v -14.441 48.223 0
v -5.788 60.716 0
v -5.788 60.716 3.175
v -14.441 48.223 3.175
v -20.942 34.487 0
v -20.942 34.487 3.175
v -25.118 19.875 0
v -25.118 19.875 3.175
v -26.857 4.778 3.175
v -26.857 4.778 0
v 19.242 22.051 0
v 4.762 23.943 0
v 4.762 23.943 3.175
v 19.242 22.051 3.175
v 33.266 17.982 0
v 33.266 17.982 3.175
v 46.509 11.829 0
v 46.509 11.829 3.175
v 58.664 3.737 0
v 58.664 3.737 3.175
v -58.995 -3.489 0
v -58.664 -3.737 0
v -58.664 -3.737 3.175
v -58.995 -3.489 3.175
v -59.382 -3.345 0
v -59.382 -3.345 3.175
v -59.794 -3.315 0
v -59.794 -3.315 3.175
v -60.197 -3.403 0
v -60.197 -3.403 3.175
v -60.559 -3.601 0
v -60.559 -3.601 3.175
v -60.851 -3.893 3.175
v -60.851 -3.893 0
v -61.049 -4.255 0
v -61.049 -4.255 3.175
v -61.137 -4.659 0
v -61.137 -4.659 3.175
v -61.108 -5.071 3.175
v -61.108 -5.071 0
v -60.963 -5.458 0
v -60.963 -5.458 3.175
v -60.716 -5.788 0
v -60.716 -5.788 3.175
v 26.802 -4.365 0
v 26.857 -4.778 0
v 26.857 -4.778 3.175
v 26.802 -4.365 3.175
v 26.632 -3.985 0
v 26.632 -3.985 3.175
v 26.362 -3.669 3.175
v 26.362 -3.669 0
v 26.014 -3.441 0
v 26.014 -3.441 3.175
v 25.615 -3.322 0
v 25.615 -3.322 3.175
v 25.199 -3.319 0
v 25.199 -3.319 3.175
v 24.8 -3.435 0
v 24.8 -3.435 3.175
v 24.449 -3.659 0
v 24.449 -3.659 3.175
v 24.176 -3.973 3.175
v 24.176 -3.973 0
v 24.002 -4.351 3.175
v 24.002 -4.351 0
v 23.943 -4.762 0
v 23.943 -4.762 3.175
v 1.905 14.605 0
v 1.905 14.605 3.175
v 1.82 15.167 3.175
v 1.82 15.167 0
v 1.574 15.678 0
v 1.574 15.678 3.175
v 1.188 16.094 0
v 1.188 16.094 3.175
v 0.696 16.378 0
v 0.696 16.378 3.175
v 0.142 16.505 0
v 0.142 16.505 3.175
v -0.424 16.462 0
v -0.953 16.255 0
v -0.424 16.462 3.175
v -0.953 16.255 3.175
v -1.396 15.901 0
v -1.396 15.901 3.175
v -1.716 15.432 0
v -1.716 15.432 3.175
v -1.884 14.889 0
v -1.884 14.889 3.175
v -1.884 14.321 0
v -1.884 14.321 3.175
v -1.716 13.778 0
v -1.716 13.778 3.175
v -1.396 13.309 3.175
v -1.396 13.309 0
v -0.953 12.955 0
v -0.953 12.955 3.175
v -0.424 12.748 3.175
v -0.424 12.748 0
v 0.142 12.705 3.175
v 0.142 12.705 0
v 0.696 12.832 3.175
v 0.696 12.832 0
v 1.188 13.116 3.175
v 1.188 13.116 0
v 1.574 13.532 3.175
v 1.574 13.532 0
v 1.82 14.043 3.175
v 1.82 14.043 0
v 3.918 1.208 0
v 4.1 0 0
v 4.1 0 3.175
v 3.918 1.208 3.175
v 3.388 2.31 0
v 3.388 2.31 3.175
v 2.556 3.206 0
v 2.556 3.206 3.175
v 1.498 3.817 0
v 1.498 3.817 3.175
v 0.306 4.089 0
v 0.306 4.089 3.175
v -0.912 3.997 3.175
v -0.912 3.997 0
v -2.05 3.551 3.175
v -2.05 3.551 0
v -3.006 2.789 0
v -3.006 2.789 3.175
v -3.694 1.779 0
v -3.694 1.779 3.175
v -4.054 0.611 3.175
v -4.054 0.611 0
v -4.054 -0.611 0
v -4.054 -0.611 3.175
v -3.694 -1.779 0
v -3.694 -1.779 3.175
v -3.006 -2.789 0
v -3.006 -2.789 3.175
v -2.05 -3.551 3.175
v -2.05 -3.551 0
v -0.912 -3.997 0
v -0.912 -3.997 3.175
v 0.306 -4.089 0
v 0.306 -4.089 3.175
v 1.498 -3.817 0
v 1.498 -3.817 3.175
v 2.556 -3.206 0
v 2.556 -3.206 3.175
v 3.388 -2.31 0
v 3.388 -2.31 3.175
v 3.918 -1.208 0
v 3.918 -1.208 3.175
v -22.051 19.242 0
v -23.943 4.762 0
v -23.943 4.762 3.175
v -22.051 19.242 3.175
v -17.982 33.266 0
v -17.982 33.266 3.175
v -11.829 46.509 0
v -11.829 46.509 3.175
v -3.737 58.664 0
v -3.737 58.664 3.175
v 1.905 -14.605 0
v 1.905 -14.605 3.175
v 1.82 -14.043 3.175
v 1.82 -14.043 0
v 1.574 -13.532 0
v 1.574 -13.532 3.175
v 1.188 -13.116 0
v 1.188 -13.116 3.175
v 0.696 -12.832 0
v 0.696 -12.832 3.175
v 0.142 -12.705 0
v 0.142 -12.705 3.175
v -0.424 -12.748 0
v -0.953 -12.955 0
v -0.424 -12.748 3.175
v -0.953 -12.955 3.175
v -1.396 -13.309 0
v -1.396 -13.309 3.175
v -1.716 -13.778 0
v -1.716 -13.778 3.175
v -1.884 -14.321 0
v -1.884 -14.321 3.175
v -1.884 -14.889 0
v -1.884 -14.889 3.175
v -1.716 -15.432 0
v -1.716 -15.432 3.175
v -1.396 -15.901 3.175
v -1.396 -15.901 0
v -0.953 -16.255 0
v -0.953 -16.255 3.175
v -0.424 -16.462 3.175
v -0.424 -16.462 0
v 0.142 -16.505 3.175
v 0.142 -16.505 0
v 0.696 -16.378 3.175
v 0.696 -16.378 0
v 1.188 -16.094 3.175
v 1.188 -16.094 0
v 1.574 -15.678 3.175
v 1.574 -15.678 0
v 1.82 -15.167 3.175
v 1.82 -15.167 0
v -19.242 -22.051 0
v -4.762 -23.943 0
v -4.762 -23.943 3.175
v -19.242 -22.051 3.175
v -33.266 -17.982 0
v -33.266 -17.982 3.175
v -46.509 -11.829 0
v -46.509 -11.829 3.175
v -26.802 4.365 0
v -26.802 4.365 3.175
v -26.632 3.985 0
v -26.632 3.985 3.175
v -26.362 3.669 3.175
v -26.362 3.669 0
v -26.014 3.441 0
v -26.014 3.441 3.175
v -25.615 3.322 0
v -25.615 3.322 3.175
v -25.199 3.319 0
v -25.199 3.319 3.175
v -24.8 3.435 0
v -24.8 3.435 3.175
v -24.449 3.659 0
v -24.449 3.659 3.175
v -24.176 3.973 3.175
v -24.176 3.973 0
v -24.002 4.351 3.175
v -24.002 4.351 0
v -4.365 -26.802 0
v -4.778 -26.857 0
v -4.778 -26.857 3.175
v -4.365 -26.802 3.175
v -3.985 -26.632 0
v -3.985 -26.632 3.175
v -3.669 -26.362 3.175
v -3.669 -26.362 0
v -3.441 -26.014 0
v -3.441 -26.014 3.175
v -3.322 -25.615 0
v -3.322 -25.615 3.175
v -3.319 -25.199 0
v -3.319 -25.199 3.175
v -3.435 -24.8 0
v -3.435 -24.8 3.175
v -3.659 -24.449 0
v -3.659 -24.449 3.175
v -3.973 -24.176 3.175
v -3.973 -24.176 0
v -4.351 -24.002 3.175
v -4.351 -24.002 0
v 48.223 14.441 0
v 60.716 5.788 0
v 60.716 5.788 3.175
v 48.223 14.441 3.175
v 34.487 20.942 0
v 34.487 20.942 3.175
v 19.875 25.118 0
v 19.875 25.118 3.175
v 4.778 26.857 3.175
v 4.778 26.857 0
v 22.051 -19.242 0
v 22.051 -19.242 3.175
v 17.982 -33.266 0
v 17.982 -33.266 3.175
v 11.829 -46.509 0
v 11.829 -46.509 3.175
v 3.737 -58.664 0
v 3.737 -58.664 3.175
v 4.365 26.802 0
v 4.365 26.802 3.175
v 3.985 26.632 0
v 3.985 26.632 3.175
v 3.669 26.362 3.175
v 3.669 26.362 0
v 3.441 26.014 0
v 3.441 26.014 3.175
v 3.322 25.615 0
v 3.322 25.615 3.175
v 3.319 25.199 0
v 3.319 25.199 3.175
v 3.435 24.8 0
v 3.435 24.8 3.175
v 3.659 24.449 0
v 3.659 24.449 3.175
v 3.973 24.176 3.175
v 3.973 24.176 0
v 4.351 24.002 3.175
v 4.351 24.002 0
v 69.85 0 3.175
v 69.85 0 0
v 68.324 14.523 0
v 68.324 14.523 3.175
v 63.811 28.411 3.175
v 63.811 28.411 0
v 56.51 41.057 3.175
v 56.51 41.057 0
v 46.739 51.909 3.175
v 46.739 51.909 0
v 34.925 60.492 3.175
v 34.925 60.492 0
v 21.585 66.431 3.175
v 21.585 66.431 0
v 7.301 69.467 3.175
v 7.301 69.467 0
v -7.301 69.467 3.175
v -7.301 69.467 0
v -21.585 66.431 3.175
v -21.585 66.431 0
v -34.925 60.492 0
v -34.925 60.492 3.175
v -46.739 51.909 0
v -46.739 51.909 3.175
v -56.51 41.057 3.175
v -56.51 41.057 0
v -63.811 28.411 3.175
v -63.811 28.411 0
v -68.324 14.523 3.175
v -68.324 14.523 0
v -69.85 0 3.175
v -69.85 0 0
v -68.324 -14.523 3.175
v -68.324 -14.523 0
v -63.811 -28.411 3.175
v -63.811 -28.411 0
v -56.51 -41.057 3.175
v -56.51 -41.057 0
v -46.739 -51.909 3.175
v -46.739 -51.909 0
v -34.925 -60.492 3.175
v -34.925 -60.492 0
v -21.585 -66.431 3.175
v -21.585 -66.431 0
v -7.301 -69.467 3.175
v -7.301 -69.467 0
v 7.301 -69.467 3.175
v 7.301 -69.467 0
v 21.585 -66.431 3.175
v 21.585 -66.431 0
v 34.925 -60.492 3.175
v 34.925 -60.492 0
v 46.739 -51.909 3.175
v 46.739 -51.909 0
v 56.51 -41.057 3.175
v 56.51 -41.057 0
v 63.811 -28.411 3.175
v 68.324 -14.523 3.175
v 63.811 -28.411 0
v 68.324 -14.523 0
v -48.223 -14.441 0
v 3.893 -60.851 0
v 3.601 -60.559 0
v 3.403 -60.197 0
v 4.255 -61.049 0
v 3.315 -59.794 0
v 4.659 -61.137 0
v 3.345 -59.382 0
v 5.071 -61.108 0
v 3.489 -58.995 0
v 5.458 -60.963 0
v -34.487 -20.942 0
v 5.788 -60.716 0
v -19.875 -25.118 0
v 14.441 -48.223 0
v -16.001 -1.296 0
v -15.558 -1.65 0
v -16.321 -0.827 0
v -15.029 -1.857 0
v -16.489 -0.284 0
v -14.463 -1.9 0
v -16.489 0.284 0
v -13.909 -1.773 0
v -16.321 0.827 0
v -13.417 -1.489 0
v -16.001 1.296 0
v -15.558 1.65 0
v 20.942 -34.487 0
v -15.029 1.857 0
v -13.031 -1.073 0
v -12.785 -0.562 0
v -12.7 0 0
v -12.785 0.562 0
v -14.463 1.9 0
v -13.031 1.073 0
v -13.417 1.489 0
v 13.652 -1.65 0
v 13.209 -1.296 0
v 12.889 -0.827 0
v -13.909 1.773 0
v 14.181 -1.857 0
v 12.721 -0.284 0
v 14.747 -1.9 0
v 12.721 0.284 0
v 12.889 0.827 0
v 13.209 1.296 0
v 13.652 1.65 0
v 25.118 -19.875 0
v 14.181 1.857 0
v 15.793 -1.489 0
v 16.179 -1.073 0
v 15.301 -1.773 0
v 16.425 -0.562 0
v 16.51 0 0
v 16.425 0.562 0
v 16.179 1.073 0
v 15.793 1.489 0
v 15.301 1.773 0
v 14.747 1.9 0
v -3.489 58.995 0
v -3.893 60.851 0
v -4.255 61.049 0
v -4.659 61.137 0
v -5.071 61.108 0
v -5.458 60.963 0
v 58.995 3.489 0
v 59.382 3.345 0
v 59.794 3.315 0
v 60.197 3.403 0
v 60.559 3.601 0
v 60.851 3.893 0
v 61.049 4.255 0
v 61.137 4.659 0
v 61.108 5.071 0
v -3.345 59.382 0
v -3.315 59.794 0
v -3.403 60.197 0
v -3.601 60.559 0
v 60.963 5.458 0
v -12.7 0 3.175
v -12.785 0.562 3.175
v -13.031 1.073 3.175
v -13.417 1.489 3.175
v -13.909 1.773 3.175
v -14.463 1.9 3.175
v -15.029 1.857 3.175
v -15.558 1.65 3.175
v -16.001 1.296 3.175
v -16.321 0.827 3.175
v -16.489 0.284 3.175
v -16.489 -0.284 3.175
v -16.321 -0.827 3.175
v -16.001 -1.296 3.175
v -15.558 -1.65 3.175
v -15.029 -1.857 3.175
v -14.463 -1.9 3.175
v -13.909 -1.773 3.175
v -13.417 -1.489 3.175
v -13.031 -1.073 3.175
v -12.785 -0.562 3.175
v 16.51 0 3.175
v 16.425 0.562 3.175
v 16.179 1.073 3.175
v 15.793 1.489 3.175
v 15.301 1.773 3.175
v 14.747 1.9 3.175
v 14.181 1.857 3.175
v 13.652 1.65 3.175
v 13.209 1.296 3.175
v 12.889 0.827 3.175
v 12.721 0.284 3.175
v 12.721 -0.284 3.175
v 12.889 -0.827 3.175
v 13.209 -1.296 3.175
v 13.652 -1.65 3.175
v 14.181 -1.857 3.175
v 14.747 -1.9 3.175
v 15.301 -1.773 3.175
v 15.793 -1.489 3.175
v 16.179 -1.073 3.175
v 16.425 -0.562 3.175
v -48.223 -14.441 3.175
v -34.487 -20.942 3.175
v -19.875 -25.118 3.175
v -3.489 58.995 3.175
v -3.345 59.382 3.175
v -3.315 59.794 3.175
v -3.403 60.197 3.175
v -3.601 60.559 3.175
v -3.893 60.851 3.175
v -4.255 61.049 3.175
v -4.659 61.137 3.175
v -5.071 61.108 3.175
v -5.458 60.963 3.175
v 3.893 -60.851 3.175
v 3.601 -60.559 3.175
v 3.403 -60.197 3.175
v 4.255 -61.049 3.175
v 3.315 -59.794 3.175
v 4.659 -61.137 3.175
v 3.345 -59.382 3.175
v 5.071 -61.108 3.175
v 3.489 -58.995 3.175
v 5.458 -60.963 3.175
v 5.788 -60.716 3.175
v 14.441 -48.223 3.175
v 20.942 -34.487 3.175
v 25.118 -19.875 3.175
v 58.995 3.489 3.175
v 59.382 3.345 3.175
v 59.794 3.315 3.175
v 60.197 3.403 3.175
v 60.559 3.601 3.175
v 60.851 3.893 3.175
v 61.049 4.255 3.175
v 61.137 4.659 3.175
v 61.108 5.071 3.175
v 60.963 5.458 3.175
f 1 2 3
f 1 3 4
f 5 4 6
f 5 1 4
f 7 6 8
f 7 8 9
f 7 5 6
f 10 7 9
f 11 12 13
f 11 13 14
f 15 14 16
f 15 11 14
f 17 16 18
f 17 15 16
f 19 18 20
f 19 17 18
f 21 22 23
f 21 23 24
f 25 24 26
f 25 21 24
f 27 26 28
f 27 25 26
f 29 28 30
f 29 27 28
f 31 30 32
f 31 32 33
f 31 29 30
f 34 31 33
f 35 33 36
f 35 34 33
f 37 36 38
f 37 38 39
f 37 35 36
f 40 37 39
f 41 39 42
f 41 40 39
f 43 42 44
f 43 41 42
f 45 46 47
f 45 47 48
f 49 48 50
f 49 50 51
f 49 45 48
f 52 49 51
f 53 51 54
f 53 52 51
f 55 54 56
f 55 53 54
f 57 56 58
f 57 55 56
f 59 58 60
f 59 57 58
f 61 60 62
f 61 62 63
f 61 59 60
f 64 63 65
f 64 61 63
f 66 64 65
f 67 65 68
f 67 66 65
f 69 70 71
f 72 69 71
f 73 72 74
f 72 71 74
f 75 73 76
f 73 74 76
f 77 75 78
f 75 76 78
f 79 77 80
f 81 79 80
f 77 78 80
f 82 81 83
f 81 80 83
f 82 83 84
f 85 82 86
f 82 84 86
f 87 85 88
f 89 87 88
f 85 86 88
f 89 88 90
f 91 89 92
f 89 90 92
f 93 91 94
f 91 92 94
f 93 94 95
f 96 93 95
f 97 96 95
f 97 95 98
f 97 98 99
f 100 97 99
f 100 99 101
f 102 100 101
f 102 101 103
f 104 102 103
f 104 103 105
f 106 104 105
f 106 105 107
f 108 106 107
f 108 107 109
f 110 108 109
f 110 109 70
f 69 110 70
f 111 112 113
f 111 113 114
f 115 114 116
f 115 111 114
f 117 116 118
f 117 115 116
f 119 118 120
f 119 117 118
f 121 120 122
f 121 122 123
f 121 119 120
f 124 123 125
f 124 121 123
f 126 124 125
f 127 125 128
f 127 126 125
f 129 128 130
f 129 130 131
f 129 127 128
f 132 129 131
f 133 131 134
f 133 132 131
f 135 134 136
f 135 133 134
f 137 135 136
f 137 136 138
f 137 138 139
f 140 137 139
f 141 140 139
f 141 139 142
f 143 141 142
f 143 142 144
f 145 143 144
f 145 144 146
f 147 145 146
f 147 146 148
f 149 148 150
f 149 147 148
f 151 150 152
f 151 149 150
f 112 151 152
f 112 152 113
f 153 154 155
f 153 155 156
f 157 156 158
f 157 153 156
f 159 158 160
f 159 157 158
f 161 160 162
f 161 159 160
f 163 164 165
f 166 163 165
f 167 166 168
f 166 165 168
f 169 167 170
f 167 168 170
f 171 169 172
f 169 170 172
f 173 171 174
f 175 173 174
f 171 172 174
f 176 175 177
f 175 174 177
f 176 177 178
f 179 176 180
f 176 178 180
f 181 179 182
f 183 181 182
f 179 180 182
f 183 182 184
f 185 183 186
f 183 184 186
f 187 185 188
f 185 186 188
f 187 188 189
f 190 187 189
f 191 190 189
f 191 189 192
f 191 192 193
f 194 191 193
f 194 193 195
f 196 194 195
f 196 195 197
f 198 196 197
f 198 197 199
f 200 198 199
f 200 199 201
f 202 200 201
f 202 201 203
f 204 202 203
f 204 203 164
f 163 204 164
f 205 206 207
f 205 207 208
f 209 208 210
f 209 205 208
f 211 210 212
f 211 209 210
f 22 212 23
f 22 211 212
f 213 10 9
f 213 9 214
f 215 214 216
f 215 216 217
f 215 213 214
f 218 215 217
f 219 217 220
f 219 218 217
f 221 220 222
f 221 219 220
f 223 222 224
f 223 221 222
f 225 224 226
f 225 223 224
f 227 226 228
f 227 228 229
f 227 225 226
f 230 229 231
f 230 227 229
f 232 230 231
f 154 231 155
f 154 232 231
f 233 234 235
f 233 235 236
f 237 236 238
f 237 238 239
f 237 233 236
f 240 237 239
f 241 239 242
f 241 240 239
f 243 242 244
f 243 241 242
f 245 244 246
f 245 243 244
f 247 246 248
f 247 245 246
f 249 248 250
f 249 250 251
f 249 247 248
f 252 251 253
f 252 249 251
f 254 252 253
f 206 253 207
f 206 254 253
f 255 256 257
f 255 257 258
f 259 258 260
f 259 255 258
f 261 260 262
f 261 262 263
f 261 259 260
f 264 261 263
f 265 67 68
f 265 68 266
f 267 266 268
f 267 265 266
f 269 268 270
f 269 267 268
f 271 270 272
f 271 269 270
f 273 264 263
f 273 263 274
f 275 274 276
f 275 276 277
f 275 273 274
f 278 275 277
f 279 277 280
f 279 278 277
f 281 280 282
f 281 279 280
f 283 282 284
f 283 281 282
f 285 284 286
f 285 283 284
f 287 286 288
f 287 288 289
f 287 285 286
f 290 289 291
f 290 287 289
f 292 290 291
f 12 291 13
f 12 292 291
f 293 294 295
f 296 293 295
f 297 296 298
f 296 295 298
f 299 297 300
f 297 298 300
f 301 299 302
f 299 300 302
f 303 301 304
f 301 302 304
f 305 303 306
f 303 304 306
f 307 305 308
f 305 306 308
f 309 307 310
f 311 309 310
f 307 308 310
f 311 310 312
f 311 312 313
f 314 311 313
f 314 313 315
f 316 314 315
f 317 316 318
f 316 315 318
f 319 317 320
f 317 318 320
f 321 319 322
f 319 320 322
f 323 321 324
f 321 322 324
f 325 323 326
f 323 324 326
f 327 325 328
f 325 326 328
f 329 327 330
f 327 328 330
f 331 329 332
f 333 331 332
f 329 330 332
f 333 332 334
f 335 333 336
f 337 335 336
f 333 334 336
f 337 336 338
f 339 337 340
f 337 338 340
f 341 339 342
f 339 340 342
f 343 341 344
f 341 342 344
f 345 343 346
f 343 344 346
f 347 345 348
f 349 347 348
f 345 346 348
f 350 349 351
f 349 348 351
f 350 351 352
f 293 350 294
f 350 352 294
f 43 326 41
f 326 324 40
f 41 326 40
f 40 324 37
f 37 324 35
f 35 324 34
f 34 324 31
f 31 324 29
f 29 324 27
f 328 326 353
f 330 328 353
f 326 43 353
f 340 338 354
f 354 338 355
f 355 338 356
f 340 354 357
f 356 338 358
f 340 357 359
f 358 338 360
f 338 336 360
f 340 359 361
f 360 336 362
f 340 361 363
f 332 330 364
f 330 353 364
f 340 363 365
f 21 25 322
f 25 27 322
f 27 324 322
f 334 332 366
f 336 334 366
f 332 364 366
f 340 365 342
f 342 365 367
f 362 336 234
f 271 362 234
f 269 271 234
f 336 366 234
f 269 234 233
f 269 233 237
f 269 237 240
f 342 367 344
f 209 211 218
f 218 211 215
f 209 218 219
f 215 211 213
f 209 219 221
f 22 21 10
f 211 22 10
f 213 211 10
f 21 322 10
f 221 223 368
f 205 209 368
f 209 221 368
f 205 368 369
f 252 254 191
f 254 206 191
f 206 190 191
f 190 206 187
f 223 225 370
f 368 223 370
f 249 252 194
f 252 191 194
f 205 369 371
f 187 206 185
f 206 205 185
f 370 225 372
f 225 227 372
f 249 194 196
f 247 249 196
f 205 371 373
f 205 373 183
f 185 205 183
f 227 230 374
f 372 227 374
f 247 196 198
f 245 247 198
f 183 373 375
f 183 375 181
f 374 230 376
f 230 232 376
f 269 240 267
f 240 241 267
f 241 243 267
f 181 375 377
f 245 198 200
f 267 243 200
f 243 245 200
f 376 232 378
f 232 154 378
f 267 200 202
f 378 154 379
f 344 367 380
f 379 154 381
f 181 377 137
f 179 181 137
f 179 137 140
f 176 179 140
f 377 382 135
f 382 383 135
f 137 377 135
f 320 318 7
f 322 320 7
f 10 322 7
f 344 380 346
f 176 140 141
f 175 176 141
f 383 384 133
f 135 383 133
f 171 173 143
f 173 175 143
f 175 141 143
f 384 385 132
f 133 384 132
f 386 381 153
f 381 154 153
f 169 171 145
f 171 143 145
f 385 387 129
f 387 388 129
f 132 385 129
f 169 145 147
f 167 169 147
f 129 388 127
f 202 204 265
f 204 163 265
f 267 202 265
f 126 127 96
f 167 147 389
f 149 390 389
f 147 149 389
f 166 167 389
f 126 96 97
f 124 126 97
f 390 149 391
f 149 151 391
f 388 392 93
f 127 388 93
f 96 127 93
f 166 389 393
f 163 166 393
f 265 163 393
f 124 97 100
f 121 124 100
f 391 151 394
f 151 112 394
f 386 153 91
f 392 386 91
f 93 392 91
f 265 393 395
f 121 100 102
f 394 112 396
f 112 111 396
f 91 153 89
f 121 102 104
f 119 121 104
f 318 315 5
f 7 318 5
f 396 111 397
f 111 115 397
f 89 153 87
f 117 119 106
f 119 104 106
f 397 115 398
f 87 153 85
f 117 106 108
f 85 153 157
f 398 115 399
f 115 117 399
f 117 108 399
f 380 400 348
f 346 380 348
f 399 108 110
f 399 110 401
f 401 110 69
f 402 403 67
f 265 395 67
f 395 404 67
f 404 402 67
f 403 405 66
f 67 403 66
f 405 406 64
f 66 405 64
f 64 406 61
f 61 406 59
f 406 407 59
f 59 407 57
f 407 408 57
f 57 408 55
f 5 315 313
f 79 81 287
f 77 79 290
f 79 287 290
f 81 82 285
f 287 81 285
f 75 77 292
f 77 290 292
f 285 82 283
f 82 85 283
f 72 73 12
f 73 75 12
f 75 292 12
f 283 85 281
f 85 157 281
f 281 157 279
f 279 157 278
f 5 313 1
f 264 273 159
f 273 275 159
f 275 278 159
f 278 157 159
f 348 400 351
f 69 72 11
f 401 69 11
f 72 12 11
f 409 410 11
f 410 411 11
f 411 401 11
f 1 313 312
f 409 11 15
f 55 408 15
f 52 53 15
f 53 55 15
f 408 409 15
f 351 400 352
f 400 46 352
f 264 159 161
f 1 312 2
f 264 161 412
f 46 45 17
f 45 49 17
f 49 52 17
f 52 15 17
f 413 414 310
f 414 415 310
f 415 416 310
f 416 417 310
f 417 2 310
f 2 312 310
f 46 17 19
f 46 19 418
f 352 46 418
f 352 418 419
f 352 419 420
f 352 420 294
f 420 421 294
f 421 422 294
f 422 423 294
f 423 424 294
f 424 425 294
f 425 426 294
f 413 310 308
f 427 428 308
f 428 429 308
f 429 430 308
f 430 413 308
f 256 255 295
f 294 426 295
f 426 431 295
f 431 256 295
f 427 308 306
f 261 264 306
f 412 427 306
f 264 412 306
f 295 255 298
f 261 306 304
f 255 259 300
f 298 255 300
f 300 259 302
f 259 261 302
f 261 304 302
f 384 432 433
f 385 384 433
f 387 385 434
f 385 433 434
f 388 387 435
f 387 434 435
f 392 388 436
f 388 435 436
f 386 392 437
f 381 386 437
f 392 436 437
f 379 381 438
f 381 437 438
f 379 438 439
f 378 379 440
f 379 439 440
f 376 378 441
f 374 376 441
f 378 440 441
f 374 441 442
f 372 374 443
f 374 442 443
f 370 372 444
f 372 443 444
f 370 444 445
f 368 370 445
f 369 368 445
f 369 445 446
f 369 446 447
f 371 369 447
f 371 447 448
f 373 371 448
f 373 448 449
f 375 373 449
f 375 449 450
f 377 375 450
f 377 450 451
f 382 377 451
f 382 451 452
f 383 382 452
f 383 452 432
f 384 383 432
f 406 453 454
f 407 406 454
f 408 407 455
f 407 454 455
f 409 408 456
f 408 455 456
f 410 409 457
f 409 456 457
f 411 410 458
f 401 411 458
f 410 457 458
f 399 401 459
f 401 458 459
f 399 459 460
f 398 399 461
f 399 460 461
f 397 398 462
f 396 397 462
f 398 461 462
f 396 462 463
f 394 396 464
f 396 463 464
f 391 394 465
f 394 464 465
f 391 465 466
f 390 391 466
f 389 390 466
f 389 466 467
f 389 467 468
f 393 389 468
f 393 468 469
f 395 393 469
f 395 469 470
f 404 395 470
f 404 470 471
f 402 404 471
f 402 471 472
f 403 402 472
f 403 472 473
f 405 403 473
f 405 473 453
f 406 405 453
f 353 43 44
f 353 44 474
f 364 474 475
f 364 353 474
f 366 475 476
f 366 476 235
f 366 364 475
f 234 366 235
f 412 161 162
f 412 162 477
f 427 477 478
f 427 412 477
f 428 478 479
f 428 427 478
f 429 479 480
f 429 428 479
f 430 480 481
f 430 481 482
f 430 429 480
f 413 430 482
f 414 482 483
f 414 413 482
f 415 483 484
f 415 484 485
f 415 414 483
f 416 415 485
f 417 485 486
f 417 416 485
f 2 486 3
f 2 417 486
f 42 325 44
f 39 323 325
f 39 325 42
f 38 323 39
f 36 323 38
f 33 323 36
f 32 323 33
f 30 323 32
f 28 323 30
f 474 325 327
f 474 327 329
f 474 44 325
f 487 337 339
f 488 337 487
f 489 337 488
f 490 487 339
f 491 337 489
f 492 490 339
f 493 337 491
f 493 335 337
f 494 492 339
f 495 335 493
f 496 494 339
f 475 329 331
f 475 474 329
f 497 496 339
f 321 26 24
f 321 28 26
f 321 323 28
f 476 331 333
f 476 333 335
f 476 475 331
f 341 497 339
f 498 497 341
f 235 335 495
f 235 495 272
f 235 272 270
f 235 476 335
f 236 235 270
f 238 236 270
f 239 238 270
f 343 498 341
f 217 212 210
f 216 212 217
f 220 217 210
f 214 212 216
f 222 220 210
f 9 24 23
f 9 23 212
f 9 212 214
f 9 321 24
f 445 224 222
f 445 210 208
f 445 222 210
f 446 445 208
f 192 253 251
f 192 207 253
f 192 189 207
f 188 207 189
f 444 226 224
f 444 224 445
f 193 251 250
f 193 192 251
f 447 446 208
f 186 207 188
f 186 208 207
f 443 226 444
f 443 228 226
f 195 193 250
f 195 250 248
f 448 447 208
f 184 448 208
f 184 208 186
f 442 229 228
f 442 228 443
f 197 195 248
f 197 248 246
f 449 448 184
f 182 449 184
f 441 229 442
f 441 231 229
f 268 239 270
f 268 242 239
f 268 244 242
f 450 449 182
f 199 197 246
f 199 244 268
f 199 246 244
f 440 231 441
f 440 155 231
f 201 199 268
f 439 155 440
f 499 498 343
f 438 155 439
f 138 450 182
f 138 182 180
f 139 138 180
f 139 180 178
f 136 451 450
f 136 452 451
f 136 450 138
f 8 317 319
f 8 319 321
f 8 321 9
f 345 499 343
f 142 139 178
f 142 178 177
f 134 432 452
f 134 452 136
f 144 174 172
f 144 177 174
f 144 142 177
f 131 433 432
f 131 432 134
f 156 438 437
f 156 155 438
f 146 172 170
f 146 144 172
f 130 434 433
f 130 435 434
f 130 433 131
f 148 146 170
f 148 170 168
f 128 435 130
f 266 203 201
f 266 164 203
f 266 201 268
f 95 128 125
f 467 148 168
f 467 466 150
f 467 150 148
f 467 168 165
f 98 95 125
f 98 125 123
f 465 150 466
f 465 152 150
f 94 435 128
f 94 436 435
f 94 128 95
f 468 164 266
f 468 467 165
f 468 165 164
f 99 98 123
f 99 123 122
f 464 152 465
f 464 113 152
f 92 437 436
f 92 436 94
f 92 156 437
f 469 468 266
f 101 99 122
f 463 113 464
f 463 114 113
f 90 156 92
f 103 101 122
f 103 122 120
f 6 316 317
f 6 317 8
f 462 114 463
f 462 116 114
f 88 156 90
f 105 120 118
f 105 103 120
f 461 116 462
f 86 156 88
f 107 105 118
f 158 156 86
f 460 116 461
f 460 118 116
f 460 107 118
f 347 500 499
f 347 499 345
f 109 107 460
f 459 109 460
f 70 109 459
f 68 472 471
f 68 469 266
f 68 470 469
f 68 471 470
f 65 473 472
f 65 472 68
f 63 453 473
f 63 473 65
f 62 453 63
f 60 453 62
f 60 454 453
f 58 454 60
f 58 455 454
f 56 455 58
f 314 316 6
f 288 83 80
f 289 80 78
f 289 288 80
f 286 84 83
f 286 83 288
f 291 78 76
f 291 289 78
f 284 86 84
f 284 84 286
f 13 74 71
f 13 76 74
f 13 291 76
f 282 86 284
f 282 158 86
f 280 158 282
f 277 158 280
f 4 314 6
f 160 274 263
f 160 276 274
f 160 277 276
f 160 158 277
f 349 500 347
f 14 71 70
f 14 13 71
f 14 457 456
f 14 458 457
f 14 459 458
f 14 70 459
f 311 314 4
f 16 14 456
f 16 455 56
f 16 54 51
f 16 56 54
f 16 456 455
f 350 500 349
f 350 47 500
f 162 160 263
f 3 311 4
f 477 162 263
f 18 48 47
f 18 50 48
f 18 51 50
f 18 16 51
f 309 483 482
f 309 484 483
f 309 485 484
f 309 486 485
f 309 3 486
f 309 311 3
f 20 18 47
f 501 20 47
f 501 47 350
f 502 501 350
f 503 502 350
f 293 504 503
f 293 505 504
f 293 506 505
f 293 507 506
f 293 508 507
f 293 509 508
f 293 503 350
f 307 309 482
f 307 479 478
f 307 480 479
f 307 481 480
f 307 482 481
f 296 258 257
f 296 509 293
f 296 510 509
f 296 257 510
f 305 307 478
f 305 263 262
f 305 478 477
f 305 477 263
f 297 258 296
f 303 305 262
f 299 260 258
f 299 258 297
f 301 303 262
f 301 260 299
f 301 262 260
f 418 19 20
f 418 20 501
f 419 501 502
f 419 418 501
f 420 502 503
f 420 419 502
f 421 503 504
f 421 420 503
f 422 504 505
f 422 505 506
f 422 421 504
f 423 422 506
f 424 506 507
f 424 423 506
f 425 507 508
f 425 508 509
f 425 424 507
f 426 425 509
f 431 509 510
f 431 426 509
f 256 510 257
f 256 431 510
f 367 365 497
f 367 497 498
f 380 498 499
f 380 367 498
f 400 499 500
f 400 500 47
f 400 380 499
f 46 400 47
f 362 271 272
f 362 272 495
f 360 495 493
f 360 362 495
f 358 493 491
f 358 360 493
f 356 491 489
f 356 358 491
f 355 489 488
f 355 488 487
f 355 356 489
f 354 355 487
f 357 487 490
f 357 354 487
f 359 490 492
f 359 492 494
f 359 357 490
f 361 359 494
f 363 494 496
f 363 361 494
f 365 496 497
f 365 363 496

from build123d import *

# Parameters (mm, degrees)
SKETCH1_R           = 69.85
SKETCH1_R_2         = 4.1
BOSS_EXTRUDE1_DEPTH = 3.175
SKETCH4_R           = 1.905
CUT_EXTRUDE1_DEPTH  = 4.175


with BuildPart() as part:
    # Sketch1 → Boss-Extrude1 (new body)
    with BuildSketch(Plane.XY):
        Circle(SKETCH1_R)
        Circle(SKETCH1_R_2, mode=Mode.SUBTRACT)
        with BuildLine():
            ThreePointArc((60.715904818, 5.788404818), (34.486591453, 20.94201271), (4.777601385, 26.856792578))
            ThreePointArc((4.777601385, 26.856792578), (3.305570957, 25.407474231), (4.762499202, 23.942975224))
            ThreePointArc((4.762499202, 23.942975224), (33.266012569, 17.981736248), (58.664095182, 3.736595182))
            ThreePointArc((58.664095182, 3.736595182), (60.715904818, 3.736595182), (60.715904818, 5.788404818))
        make_face(mode=Mode.SUBTRACT)
        with BuildLine():
            ThreePointArc((-23.942975224, 4.762499202), (-17.981736248, 33.266012569), (-3.736595182, 58.664095182))
            ThreePointArc((-3.736595182, 58.664095182), (-3.736595182, 60.715904818), (-5.788404818, 60.715904818))
            ThreePointArc((-5.788404818, 60.715904818), (-20.94201271, 34.486591453), (-26.856792578, 4.777601385))
            ThreePointArc((-26.856792578, 4.777601385), (-25.407474231, 3.305570957), (-23.942975224, 4.762499202))
        make_face(mode=Mode.SUBTRACT)
        with BuildLine():
            ThreePointArc((5.788404818, -60.715904818), (20.94201271, -34.486591453), (26.856792578, -4.777601385))
            ThreePointArc((26.856792578, -4.777601385), (25.407474231, -3.305570957), (23.942975224, -4.762499202))
            ThreePointArc((23.942975224, -4.762499202), (17.981736248, -33.266012569), (3.736595182, -58.664095182))
            ThreePointArc((3.736595182, -58.664095182), (3.736595182, -60.715904818), (5.788404818, -60.715904818))
        make_face(mode=Mode.SUBTRACT)
        with BuildLine():
            ThreePointArc((-60.715904818, -5.788404818), (-34.486591453, -20.94201271), (-4.777601385, -26.856792578))
            ThreePointArc((-4.777601385, -26.856792578), (-3.305570957, -25.407474231), (-4.762499202, -23.942975224))
            ThreePointArc((-4.762499202, -23.942975224), (-33.266012569, -17.981736248), (-58.664095182, -3.736595182))
            ThreePointArc((-58.664095182, -3.736595182), (-60.715904818, -3.736595182), (-60.715904818, -5.788404818))
        make_face(mode=Mode.SUBTRACT)
    extrude(amount=BOSS_EXTRUDE1_DEPTH)

    # Sketch4 → Cut-Extrude1 (cut, through all)
    with BuildSketch(Plane.XY.offset(3.175)):
        with Locations((14.605, 0)):
            Circle(SKETCH4_R)
        with Locations((0, -14.605)):
            Circle(SKETCH4_R)
        with Locations((-14.605, 0)):
            Circle(SKETCH4_R)
        with Locations((0, 14.605)):
            Circle(SKETCH4_R)
    extrude(amount=-CUT_EXTRUDE1_DEPTH, mode=Mode.SUBTRACT)


solid = part.part
